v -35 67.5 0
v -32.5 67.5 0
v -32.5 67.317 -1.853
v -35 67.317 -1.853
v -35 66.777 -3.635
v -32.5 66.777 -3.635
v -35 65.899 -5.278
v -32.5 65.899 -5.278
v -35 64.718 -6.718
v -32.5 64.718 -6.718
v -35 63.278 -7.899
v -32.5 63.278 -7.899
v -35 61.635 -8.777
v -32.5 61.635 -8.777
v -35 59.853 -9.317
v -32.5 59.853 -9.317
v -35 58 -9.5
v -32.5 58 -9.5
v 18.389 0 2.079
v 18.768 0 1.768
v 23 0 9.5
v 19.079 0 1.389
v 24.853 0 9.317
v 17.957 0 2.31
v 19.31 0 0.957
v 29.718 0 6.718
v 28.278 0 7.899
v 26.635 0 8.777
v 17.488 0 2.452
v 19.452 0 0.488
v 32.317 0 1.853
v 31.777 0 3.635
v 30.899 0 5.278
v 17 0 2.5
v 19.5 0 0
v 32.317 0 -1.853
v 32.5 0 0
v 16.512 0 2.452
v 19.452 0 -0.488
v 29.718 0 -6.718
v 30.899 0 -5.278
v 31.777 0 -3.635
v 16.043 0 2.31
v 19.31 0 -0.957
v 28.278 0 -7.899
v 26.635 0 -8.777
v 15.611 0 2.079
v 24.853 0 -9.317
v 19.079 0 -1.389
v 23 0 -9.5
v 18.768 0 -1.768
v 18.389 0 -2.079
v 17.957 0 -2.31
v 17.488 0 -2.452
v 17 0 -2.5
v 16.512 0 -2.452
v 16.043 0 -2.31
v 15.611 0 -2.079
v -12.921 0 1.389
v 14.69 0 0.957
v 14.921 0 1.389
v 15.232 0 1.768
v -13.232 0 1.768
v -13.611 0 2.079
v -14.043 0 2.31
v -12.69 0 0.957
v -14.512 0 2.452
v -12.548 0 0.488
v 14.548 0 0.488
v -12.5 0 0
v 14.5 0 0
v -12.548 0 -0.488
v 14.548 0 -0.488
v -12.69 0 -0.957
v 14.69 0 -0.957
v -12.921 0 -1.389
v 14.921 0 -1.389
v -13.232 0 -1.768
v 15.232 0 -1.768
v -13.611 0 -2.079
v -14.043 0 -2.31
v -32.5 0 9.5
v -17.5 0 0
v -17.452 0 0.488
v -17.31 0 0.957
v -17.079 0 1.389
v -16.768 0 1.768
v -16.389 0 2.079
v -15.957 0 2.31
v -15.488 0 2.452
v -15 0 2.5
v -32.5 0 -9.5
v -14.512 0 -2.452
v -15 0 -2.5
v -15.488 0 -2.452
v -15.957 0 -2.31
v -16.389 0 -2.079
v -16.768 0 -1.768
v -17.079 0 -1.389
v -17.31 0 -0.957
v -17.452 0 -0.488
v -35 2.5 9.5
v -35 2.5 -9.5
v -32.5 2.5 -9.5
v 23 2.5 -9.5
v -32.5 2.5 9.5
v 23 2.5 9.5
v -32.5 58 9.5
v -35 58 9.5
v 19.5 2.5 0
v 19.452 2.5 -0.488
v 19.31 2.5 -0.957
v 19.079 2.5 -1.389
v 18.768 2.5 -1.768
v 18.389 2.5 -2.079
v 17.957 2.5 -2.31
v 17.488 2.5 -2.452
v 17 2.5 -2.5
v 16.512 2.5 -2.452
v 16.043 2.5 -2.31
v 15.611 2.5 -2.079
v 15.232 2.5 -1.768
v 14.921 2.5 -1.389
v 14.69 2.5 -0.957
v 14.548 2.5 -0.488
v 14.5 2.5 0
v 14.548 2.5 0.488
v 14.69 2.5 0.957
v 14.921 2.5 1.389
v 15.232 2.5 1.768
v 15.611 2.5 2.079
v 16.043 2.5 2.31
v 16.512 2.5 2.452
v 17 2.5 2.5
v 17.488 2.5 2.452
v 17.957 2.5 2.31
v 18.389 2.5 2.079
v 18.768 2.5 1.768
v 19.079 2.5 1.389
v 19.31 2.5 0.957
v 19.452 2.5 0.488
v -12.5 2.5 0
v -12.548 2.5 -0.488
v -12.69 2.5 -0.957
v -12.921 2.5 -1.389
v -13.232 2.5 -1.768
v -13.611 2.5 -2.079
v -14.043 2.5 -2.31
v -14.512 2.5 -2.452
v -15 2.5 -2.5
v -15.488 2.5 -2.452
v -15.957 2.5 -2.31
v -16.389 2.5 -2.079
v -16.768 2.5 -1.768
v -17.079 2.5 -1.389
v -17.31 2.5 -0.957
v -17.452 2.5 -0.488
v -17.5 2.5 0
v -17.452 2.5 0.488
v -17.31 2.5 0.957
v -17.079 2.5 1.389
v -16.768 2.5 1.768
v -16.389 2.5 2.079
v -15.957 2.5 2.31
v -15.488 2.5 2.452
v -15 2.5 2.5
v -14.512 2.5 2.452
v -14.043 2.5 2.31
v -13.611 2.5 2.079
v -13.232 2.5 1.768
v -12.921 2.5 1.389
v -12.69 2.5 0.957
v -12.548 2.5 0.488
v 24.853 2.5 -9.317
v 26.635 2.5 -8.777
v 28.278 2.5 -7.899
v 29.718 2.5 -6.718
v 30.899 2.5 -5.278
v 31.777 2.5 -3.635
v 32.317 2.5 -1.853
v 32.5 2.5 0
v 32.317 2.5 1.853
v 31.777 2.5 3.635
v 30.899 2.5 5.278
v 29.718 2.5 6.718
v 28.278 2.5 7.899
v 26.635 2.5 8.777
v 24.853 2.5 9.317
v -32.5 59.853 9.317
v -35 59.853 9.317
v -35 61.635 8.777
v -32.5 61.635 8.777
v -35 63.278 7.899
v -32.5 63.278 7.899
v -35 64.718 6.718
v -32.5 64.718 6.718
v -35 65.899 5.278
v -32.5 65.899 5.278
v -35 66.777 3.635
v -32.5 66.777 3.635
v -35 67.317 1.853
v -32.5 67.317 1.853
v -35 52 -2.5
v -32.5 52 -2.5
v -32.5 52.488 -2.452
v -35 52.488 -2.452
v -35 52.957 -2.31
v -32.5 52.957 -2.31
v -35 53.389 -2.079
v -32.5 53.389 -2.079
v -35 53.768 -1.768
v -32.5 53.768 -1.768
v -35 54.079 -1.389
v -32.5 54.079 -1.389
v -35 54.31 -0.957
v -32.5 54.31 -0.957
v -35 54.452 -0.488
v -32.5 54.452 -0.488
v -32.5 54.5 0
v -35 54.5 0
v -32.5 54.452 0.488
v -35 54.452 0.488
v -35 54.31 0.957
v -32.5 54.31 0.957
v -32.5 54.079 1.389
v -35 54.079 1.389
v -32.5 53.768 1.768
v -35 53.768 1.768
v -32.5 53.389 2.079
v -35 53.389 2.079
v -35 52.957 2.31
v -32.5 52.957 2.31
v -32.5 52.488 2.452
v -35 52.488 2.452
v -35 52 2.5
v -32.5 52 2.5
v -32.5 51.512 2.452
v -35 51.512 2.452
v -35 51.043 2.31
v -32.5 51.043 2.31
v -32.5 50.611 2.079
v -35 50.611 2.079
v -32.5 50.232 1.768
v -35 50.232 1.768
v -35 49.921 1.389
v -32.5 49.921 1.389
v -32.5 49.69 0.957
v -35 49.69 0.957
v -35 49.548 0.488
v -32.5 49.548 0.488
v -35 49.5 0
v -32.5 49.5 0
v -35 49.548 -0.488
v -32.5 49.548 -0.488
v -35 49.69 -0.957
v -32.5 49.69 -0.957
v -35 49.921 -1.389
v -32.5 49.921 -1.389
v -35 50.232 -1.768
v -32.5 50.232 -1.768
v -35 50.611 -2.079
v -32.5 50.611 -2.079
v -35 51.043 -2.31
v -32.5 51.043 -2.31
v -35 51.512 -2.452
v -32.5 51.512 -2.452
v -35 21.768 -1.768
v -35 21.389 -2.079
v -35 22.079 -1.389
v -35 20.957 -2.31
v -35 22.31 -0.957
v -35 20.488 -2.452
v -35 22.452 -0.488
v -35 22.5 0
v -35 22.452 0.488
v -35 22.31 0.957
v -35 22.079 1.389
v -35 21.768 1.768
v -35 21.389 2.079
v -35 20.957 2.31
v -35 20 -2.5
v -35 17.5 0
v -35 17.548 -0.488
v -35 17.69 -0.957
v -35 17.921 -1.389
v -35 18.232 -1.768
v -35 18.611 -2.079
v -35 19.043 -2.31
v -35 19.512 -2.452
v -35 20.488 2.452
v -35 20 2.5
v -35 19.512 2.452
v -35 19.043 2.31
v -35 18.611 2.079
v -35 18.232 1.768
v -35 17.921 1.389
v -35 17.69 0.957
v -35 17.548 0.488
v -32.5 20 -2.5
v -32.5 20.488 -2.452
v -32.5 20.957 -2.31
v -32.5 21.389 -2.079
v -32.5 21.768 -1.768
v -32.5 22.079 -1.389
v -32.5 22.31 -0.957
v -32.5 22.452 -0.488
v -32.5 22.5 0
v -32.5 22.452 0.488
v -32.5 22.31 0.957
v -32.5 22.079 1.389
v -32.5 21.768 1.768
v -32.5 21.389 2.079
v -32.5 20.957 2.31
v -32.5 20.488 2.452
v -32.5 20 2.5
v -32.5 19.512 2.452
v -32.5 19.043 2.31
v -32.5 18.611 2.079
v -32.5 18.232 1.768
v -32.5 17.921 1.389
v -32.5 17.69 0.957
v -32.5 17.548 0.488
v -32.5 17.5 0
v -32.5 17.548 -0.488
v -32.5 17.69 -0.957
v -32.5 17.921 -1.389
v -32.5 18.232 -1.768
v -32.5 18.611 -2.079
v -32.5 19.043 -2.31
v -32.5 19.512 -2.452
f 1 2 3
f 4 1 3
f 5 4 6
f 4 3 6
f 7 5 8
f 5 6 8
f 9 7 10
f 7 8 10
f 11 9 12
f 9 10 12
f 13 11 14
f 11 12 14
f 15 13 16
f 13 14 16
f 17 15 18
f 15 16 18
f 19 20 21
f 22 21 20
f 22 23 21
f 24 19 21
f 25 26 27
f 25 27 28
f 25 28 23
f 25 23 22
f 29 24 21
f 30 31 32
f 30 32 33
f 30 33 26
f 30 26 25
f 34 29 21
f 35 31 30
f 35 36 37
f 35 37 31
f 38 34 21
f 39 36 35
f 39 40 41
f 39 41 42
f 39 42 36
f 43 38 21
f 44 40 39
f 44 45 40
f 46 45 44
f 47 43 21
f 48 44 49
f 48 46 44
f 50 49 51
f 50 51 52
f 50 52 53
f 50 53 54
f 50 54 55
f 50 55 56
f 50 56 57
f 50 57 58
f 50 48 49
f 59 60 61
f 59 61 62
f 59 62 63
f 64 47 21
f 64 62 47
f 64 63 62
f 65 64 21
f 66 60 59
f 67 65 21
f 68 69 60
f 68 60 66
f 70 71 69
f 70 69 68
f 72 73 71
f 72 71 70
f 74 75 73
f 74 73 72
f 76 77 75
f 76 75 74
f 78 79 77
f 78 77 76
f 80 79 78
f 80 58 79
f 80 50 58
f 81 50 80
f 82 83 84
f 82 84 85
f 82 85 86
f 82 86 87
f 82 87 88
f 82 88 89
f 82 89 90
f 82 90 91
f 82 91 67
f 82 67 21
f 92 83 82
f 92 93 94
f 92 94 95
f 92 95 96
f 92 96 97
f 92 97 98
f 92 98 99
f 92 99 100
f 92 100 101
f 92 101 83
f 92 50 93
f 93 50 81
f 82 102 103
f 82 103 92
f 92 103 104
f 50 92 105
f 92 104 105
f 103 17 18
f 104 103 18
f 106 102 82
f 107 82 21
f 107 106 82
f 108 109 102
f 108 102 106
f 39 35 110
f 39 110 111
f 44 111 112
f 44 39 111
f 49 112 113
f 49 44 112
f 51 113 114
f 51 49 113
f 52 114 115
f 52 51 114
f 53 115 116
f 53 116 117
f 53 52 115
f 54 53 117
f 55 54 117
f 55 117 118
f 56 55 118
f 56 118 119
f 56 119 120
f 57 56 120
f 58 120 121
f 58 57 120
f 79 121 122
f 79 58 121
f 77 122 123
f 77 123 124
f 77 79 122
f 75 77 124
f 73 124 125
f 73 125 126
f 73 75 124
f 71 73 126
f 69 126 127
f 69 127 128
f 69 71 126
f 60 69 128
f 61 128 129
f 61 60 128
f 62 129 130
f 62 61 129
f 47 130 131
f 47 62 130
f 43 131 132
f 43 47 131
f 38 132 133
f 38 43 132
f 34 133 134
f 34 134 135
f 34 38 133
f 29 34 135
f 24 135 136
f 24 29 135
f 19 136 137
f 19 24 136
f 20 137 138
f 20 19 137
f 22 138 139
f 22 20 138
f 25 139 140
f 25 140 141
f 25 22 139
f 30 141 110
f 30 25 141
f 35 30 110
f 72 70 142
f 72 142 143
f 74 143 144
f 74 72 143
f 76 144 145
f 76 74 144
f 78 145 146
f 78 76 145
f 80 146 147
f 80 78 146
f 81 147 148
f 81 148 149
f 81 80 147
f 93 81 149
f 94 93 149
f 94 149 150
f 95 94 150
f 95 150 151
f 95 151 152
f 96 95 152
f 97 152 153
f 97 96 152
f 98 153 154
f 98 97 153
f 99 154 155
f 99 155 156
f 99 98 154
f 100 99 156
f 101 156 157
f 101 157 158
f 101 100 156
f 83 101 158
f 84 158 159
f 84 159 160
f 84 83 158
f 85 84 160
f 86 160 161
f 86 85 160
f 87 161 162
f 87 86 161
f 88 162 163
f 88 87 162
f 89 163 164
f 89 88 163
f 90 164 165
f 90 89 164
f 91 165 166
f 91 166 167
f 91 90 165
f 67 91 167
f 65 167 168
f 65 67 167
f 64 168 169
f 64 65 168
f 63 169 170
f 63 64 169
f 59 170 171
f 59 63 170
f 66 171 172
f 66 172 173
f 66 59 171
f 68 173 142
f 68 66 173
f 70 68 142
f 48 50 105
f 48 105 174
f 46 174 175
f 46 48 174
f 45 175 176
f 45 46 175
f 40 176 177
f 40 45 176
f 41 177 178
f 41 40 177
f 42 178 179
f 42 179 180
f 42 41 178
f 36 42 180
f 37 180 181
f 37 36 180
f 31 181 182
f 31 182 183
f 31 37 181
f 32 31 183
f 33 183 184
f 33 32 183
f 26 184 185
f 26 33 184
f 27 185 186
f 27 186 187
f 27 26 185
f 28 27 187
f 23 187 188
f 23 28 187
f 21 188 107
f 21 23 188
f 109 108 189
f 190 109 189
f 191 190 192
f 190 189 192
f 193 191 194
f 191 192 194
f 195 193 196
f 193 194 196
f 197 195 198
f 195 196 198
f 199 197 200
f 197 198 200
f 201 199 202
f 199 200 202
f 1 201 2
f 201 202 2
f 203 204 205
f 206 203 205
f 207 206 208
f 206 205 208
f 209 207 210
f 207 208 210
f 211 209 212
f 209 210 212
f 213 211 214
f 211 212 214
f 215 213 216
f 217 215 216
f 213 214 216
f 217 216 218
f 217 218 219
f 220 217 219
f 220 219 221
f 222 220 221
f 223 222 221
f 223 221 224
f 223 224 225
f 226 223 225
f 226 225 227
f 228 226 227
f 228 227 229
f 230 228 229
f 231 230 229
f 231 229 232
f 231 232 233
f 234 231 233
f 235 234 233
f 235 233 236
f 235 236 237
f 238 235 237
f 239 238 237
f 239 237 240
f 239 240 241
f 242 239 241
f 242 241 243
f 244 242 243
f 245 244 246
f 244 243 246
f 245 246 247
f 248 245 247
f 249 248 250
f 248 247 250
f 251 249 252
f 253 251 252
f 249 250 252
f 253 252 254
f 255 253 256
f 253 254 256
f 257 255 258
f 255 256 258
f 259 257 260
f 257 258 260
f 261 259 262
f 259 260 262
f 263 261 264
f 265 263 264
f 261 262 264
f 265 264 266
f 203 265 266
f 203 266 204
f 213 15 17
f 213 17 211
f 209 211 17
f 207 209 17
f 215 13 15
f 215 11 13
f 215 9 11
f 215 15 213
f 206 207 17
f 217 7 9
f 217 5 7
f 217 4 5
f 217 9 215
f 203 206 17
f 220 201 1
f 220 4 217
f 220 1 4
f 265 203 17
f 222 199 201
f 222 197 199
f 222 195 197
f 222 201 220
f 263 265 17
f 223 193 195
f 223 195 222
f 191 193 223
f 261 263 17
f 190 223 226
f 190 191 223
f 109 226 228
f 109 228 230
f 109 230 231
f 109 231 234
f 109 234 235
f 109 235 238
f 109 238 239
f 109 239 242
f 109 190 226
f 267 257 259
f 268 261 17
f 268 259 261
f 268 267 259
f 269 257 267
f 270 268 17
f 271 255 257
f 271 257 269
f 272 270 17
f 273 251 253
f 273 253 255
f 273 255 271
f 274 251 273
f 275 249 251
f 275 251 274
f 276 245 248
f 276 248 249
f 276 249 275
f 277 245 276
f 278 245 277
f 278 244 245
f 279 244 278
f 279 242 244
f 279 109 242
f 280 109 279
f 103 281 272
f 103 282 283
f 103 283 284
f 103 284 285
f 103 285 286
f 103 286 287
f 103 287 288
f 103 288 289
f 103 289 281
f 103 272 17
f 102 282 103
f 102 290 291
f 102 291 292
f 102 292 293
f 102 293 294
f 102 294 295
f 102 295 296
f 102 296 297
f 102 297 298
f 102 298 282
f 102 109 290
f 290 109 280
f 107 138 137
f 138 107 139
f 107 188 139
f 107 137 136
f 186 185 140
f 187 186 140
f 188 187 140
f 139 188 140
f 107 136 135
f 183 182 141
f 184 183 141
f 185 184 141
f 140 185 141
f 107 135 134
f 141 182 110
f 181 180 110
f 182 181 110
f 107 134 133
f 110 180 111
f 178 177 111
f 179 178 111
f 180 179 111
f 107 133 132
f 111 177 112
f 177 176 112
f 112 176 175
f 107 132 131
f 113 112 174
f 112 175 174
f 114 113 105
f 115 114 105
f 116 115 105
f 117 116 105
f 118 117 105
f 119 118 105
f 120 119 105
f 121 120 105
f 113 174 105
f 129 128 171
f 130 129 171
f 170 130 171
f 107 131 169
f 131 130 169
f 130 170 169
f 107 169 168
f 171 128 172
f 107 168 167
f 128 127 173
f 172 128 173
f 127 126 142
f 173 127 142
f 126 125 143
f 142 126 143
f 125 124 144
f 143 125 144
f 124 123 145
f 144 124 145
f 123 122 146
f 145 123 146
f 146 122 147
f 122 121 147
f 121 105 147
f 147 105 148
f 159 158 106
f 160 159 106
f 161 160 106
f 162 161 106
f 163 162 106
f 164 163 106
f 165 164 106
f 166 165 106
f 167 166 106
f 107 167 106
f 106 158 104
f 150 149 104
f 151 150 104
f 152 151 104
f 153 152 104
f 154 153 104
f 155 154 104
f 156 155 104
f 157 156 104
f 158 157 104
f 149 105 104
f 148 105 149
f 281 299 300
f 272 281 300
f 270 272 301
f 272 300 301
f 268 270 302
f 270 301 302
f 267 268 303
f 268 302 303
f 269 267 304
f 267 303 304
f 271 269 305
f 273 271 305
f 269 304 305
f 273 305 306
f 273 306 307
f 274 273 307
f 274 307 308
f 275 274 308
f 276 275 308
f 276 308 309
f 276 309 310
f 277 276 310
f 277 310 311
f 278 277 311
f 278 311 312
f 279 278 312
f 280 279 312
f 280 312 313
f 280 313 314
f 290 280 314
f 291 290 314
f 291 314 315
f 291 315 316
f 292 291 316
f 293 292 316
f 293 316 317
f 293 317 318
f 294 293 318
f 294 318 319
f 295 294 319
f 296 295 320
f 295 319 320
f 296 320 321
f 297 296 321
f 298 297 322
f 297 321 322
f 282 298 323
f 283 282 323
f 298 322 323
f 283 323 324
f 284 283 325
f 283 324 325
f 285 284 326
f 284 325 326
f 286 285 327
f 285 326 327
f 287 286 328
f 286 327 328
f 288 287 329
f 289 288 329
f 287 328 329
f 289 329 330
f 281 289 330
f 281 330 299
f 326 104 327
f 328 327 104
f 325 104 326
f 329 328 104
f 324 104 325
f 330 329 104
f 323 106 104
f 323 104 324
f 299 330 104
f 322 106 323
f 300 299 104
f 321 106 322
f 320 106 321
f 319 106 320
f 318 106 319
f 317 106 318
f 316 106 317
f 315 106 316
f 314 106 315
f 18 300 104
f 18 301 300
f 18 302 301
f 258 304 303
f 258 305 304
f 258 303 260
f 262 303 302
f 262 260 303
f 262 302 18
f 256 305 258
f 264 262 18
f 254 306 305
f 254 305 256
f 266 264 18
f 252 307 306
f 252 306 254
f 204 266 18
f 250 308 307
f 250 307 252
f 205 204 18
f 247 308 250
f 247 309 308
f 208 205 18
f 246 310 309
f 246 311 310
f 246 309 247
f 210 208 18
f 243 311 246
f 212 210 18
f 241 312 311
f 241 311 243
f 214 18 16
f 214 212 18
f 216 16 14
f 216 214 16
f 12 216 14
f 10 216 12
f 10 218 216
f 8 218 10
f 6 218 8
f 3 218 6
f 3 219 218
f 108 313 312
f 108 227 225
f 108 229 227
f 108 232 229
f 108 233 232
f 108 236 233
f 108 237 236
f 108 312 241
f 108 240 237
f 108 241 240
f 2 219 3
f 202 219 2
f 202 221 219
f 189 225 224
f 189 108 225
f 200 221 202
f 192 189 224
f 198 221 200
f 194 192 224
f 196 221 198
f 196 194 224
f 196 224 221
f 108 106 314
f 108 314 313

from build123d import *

# Parameters (mm, degrees)
SKETCH_1_R          = 2.5
EXTRUDE_1_DEPTH     = 2.5
EXTRUDE_2_DEPTH     = 19
CUT_EXTRUDE_1_DEPTH = 19
SKETCH_4_R          = 2.5
CUT_EXTRUDE_2_DEPTH = 19


with BuildPart() as part:
    # 草图1 → 凸台-拉伸1 (new body)
    with BuildSketch(Plane(origin=(0, 0, 0), x_dir=(1, 0, 0), z_dir=(0, 1, 0))):
        with BuildLine():
            Line((23, -9.5), (-32.5, -9.5))
            Line((-32.5, -9.5), (-32.5, 9.5))
            Line((-32.5, 9.5), (23, 9.5))
            ThreePointArc((23, 9.5), (32.5, 0), (23, -9.5))
        make_face()
        with Locations((-15, 0)):
            Circle(SKETCH_1_R, mode=Mode.SUBTRACT)
        with Locations((17, 0)):
            Circle(SKETCH_1_R, mode=Mode.SUBTRACT)
    extrude(amount=EXTRUDE_1_DEPTH)

    # 草图2 → 凸台-拉伸2 (add)
    with BuildSketch(Plane.XY.offset(9.5)):
        Polygon((-35, 2.5), (-32.5, 0), (-32.5, 2.5), (-32.5, 67.5), (-35, 67.5), align=None)
    extrude(amount=-EXTRUDE_2_DEPTH)

    # 草图3 → 切除-拉伸1 (cut)
    with BuildSketch(Plane(origin=(-32.5, 0, 0), x_dir=(0, 0, -1), z_dir=(1, 0, 0))):
        with BuildLine():
            Line((9.5, 67.5), (0, 67.5))
            ThreePointArc((0, 67.5), (6.717514421, 64.717514421), (9.5, 58))
            Line((9.5, 58), (9.5, 67.5))
        make_face()
        with BuildLine():
            Line((0, 67.5), (-9.5, 67.5))
            Line((-9.5, 67.5), (-9.5, 58))
            ThreePointArc((-9.5, 58), (-6.717514421, 64.717514421), (0, 67.5))
        make_face()
    extrude(amount=-CUT_EXTRUDE_1_DEPTH, mode=Mode.SUBTRACT)

    # 草图4 → 切除-拉伸2 (cut)
    with BuildSketch(Plane(origin=(-32.5, 0, 0), x_dir=(0, 0, -1), z_dir=(1, 0, 0))):
        with Locations((0, 52)):
            Circle(SKETCH_4_R)
        with Locations((0, 20)):
            Circle(SKETCH_4_R)
    extrude(amount=-CUT_EXTRUDE_2_DEPTH, mode=Mode.SUBTRACT)


solid = part.part
